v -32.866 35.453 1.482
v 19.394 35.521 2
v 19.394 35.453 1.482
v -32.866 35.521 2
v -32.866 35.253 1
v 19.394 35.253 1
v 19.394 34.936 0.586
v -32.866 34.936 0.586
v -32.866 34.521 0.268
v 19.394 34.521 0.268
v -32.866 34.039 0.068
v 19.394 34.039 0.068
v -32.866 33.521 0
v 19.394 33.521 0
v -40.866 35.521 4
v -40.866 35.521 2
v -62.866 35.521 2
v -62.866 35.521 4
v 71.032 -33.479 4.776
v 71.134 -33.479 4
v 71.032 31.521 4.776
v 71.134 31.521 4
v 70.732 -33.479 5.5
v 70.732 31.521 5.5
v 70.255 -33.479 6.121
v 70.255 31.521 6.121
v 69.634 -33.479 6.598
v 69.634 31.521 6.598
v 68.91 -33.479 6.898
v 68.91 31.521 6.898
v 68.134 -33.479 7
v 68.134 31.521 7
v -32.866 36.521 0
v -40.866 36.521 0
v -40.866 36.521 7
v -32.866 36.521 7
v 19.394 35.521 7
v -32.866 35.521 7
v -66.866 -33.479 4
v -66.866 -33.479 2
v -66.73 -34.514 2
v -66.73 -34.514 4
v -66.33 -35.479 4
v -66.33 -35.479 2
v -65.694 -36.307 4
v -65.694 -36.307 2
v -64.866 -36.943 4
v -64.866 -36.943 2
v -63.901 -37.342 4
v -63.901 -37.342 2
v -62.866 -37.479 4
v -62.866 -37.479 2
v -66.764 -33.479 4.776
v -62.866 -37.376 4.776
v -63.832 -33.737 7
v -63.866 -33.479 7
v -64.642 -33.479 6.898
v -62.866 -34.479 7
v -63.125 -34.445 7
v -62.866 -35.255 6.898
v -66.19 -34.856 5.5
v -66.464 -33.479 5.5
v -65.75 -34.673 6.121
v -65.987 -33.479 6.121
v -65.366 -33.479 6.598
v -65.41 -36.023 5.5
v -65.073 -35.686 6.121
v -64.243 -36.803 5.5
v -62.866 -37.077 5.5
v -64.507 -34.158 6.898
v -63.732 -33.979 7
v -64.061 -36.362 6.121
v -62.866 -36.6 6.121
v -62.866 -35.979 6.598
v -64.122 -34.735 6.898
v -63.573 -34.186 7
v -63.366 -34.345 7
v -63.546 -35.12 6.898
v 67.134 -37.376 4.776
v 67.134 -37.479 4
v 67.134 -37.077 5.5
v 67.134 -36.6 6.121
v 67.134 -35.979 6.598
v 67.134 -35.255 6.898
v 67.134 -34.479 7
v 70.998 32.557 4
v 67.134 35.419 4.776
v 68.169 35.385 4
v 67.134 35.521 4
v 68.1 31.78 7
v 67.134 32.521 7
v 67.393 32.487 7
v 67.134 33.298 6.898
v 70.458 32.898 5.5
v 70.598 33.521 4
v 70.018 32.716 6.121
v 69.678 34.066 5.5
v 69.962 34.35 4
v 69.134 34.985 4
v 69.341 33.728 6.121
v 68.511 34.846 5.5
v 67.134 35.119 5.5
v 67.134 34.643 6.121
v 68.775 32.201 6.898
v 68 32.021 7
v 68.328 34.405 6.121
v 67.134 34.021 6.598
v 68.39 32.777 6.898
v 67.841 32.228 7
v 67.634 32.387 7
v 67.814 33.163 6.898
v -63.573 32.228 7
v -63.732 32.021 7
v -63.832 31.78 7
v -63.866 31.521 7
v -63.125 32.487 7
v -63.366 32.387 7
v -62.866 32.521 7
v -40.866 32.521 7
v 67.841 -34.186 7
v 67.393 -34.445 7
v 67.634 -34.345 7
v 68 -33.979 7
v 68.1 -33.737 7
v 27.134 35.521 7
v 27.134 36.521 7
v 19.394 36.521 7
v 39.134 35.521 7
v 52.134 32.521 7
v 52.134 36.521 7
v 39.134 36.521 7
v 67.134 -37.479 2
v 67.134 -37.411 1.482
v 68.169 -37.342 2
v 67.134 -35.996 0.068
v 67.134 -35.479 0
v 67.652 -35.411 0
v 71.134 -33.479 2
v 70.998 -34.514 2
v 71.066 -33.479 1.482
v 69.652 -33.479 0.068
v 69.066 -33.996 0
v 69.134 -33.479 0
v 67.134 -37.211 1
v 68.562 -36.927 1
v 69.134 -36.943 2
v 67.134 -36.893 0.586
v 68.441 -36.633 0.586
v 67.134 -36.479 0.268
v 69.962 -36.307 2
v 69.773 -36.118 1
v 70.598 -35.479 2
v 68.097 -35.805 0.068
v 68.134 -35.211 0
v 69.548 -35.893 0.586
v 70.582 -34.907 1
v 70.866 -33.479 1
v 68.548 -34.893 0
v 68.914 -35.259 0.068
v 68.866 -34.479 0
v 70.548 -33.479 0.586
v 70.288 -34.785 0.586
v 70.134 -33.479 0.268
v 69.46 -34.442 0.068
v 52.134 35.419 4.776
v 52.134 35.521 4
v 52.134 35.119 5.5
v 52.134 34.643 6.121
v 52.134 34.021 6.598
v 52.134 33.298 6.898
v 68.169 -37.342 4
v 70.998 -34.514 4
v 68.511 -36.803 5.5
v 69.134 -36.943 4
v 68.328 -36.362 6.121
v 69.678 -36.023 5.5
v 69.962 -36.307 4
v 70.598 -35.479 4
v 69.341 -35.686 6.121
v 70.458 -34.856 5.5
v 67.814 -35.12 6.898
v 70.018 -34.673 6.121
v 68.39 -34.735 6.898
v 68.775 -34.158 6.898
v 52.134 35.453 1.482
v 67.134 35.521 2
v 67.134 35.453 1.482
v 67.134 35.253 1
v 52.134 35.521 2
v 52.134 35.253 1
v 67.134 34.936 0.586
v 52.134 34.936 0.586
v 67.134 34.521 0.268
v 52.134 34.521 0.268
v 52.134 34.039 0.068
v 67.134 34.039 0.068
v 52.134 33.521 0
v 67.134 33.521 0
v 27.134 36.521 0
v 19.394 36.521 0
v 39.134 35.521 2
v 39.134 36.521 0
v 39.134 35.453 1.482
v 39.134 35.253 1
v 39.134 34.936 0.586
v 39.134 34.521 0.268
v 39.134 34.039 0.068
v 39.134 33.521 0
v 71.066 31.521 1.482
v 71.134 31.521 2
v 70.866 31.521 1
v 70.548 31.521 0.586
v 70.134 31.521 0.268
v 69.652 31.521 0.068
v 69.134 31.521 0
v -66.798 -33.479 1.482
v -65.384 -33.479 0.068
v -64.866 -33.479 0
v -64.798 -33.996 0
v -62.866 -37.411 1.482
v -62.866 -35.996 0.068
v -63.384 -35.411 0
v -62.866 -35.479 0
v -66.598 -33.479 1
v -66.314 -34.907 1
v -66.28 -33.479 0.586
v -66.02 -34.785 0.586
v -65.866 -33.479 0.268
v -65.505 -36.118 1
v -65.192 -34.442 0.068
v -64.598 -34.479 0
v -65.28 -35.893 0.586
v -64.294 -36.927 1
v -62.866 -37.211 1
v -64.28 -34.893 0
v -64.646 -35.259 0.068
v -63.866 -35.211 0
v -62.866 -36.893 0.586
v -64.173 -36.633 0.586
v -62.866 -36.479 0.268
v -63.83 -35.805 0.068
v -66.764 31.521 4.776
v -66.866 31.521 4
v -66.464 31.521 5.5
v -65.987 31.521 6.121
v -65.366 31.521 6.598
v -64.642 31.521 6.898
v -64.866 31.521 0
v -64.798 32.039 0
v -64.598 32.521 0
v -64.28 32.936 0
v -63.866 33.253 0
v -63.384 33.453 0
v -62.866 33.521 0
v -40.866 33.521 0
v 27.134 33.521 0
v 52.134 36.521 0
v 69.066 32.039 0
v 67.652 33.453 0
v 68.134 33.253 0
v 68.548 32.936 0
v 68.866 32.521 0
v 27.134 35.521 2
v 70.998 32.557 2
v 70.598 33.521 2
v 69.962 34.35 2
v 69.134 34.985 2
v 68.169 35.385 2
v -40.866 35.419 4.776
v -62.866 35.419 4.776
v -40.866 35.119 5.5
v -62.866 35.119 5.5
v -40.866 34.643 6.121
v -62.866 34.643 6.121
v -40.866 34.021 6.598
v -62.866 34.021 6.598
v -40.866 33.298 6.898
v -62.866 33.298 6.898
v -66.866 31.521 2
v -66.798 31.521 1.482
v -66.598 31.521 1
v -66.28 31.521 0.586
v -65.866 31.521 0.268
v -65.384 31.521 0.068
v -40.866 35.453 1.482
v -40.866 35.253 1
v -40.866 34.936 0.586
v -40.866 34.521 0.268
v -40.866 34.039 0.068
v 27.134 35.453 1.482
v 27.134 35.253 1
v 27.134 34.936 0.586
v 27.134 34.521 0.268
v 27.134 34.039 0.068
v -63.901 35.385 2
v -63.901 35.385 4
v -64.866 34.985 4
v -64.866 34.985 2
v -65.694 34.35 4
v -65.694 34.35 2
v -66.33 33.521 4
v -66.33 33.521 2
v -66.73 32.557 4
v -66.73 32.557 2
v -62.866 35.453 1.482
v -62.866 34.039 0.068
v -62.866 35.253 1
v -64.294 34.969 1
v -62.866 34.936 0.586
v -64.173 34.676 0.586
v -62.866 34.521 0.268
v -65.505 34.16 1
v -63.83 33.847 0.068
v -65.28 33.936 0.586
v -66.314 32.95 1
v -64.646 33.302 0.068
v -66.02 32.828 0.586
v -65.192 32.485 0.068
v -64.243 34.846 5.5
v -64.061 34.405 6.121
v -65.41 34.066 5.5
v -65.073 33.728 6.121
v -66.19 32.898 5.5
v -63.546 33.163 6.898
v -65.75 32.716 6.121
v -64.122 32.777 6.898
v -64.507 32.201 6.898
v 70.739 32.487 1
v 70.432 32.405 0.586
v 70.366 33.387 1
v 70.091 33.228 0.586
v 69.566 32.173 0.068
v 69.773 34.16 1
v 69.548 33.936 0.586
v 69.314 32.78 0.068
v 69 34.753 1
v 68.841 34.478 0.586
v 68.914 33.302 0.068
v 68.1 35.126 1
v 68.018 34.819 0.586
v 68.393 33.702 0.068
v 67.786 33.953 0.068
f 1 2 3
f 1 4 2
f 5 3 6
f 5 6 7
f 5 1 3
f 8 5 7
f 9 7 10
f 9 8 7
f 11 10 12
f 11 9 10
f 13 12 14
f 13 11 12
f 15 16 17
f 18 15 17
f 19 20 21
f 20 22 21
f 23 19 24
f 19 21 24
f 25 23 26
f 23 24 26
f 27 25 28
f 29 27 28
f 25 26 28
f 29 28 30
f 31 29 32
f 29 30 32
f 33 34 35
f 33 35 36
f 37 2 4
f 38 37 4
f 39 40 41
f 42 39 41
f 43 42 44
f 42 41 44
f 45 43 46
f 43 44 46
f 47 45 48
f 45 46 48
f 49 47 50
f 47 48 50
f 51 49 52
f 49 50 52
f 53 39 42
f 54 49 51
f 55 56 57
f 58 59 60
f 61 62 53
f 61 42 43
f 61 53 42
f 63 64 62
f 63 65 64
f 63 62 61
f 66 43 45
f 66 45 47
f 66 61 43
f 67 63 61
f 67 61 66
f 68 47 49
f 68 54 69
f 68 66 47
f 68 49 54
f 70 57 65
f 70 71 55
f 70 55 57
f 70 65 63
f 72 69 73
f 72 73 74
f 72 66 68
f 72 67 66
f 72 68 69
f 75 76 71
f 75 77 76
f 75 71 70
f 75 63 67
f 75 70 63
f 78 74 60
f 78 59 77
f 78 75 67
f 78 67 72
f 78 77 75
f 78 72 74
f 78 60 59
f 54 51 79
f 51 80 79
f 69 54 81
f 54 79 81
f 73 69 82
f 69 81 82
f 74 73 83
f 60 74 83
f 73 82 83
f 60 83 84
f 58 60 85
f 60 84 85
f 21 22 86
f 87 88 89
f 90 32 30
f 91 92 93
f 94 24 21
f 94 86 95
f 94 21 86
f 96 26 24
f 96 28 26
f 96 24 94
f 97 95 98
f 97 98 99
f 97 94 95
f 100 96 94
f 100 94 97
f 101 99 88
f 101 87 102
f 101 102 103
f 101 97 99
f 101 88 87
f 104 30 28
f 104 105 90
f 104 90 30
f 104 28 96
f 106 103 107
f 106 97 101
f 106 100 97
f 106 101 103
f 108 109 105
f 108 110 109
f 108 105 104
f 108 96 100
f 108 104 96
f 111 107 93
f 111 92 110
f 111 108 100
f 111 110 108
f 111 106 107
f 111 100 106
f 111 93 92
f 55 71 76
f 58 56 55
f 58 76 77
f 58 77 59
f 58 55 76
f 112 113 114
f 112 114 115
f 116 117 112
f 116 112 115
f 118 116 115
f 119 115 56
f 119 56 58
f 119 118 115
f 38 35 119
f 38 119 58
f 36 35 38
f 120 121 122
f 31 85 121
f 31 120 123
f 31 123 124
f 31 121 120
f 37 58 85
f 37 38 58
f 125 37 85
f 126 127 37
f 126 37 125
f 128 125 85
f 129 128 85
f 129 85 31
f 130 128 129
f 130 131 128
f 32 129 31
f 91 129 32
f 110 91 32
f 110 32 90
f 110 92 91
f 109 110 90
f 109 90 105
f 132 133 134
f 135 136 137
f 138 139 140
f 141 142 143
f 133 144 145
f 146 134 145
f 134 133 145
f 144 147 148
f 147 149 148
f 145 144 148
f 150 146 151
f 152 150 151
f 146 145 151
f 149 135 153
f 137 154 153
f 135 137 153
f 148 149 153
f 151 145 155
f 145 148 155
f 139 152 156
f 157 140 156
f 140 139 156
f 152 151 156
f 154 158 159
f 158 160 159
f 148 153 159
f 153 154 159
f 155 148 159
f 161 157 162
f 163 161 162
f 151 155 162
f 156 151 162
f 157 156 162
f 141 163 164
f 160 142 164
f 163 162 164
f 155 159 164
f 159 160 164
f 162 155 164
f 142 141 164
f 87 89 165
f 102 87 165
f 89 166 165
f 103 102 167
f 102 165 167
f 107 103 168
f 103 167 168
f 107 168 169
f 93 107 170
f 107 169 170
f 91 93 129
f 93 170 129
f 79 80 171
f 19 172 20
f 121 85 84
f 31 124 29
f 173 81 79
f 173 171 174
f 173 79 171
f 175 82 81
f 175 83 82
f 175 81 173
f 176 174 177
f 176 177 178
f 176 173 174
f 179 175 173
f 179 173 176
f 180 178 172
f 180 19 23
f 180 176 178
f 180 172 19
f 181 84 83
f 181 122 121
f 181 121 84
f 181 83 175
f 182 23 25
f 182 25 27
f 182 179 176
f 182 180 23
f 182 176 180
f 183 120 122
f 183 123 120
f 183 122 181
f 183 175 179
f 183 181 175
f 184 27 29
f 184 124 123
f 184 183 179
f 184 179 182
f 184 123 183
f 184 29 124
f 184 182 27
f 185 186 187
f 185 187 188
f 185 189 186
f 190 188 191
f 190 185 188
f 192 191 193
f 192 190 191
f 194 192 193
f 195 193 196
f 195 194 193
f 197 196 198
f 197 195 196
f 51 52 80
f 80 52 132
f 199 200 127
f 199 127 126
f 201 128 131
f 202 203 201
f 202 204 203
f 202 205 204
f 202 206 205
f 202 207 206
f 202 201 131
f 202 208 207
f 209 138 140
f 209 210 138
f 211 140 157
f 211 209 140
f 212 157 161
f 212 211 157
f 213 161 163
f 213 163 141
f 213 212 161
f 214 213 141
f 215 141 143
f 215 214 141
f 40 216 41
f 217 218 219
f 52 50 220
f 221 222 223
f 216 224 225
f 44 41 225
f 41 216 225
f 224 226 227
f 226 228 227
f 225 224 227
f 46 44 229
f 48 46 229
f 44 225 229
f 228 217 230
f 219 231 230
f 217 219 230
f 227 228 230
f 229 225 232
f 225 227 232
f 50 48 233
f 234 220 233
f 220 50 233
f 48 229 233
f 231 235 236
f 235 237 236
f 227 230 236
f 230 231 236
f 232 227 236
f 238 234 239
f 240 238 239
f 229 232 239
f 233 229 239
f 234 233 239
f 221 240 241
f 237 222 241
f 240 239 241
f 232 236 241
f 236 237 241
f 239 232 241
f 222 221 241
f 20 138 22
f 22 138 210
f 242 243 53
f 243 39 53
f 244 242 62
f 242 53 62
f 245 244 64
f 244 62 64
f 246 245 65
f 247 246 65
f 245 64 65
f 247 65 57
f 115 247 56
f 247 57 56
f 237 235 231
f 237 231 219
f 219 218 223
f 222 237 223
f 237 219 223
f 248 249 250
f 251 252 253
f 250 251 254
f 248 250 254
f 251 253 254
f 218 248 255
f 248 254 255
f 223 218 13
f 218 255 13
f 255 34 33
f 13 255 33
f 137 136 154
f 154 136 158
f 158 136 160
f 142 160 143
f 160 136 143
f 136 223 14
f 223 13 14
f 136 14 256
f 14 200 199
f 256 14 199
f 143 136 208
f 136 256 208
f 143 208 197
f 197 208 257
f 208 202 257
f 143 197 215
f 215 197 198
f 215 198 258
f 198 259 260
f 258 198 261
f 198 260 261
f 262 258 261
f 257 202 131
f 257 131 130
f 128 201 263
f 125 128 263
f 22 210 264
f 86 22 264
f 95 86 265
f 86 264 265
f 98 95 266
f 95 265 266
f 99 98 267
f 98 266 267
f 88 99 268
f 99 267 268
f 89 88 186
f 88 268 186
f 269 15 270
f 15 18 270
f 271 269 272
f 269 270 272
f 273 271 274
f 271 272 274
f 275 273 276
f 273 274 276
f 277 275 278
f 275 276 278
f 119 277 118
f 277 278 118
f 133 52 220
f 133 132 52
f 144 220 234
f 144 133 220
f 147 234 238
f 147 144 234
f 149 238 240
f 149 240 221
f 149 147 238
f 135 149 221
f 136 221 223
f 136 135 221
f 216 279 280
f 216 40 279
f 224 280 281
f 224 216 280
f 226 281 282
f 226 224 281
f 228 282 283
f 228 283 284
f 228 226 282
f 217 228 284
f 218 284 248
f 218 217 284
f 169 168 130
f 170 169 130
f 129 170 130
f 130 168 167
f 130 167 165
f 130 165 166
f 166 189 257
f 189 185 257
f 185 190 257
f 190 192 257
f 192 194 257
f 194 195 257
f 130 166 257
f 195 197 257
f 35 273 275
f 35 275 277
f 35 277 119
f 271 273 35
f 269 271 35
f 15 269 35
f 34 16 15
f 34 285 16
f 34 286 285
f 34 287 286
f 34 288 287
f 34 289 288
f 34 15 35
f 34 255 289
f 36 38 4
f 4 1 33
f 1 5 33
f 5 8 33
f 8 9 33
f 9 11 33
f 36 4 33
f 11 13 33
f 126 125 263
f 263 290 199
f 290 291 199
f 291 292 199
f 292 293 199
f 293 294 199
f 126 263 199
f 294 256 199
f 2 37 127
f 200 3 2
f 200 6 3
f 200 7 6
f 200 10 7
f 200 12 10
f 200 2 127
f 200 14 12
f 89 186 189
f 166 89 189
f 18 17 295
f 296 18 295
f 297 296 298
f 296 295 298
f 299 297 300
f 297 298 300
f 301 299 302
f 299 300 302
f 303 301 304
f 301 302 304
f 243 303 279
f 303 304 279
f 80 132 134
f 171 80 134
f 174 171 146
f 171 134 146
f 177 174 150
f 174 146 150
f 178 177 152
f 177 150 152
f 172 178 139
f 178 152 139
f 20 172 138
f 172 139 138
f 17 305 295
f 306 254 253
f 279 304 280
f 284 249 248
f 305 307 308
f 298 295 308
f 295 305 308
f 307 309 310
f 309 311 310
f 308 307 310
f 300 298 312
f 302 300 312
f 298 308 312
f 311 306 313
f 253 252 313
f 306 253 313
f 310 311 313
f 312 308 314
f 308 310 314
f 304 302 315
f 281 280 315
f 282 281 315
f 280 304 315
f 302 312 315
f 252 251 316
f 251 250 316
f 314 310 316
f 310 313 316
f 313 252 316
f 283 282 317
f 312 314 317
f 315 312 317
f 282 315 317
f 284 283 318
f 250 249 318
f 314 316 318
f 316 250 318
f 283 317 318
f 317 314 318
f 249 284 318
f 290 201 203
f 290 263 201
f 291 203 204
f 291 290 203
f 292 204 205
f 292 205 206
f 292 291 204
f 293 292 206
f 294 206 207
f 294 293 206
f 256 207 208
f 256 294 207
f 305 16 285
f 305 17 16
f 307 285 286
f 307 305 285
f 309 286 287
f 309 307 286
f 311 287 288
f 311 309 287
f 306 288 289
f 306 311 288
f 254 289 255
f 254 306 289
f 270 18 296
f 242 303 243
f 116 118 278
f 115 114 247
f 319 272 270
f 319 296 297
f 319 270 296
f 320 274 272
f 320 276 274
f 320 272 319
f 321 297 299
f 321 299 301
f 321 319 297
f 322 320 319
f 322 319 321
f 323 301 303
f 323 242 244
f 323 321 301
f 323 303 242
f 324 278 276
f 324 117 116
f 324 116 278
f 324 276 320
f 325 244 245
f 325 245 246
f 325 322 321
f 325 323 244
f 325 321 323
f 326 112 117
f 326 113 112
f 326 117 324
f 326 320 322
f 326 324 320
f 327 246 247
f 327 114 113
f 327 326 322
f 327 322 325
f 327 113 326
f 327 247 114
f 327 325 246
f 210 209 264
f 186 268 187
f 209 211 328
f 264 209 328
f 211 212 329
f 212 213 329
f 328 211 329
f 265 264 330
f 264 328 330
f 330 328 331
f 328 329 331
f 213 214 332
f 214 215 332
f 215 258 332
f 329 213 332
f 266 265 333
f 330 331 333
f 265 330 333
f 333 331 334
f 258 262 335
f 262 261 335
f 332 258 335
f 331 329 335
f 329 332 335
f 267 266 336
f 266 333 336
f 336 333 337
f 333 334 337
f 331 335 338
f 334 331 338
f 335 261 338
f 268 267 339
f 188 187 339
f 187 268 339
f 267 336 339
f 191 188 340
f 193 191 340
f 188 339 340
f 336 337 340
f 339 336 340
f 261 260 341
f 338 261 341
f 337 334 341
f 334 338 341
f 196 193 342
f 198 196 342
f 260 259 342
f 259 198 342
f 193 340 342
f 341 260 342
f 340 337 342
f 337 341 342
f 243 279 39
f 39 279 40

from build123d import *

# Parameters (mm, degrees)
F0_W     = 8
F0_H     = 1
F0_W_2   = 7.7403839678
F0_W_3   = 13
F1_DEPTH = 7
F2_R     = 3
F3_R     = 2


with BuildPart() as f1:
    # F0 (on Top) → F1 (new body)
    with BuildSketch(Plane.XY):
        with BuildLine():
            Line((-40.8660421073, 35.5213209987), (-62.8660421073, 35.5213209987))
            ThreePointArc((-62.8660421073, 35.5213209987), (-65.6944692321, 34.3497481234), (-66.8660421073, 31.5213209987))
            Line((-66.8660421073, 31.5213209987), (-66.8660421073, 5.6138705388))
            Line((-66.8660421073, 5.6138705388), (-65.8120451986, 5.6138705388))
            ThreePointArc((-65.8120451986, 5.6138705388), (-65.5673840665, 5.5125285796), (-65.4660421073, 5.2678674475))
            Line((-65.4660421073, 5.2678674475), (-65.4660421073, -2.04012637))
            ThreePointArc((-65.4660421073, -2.04012637), (-65.5673840665, -2.2847875021), (-65.8120451986, -2.3861294612))
            Line((-65.8120451986, -2.3861294612), (-66.8660421073, -2.3861294612))
            Line((-66.8660421073, -2.3861294612), (-66.8660421073, -33.4786790013))
            ThreePointArc((-66.8660421073, -33.4786790013), (-65.6944692321, -36.3071061261), (-62.8660421073, -37.4786790013))
            Line((-62.8660421073, -37.4786790013), (67.1339578927, -37.4786790013))
            ThreePointArc((67.1339578927, -37.4786790013), (69.9623850174, -36.3071061261), (71.1339578927, -33.4786790013))
            Line((71.1339578927, -33.4786790013), (71.1339578927, 31.5213209987))
            ThreePointArc((71.1339578927, 31.5213209987), (69.9623850174, 34.3497481234), (67.1339578927, 35.5213209987))
            Line((67.1339578927, 35.5213209987), (52.1339578927, 35.5213209987))
            Line((52.1339578927, 35.5213209987), (39.1339578927, 35.5213209987))
            Line((39.1339578927, 35.5213209987), (27.1339578927, 35.5213209987))
            Line((27.1339578927, 35.5213209987), (19.3935739249, 35.5213209987))
            Line((19.3935739249, 35.5213209987), (-32.8660421073, 35.5213209987))
            Line((-32.8660421073, 35.5213209987), (-40.8660421073, 35.5213209987))
        make_face()
        with Locations((-36.8660421073, 36.0213209987)):
            Rectangle(F0_W, F0_H)
        with BuildLine():
            Line((-65.8120451986, 5.6138705388), (-66.8660421073, 5.6138705388))
            Line((-66.8660421073, 5.6138705388), (-66.8660421073, -2.3861294612))
            Line((-66.8660421073, -2.3861294612), (-65.8120451986, -2.3861294612))
            ThreePointArc((-65.8120451986, -2.3861294612), (-65.5673840665, -2.2847875021), (-65.4660421073, -2.04012637))
            Line((-65.4660421073, -2.04012637), (-65.4660421073, 5.2678674475))
            ThreePointArc((-65.4660421073, 5.2678674475), (-65.5673840665, 5.5125285796), (-65.8120451986, 5.6138705388))
        make_face()
        with Locations((23.2637659088, 36.0213209987)):
            Rectangle(F0_W_2, F0_H)
        with Locations((45.6339578927, 36.0213209987)):
            Rectangle(F0_W_3, F0_H)
    extrude(amount=F1_DEPTH)

    # F2
    f2_edges = [f1.edges().sort_by_distance(p)[0] for p in [
        (2.133958, -37.478679, 7),
    ]]
    fillet(f2_edges, radius=F2_R)

    # F3
    f3_edges = [f1.edges().sort_by_distance(p)[0] for p in [
        (2.133958, -37.478679, 0),
        (-6.736234, 35.521321, 0),
        (33.133958, 35.521321, 0),
    ]]
    fillet(f3_edges, radius=F3_R)


solid = f1.part
